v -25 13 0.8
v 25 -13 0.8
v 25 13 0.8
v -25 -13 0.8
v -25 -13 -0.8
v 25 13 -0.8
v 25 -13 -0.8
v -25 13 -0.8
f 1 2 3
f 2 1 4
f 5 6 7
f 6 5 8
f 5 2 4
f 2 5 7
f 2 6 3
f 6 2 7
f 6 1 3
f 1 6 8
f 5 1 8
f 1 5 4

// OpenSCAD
// Parameters
length = 50; //[25:100:0.1]
width = 26; //[13:52:0.1]
thickness = 1.6; //[0.8:3.2:0.1]
corner_radius = 0; //[0:5:0.1]

// PCB-style relay module - complete geometry
module mod() {
  color([0.0, 0.4, 0.2]) { // PCB green color
    // PCB Board
    cube([length, width, thickness], center=true);
  }
}

// Assembly
module assembly() {
  mod();
}

assembly();
